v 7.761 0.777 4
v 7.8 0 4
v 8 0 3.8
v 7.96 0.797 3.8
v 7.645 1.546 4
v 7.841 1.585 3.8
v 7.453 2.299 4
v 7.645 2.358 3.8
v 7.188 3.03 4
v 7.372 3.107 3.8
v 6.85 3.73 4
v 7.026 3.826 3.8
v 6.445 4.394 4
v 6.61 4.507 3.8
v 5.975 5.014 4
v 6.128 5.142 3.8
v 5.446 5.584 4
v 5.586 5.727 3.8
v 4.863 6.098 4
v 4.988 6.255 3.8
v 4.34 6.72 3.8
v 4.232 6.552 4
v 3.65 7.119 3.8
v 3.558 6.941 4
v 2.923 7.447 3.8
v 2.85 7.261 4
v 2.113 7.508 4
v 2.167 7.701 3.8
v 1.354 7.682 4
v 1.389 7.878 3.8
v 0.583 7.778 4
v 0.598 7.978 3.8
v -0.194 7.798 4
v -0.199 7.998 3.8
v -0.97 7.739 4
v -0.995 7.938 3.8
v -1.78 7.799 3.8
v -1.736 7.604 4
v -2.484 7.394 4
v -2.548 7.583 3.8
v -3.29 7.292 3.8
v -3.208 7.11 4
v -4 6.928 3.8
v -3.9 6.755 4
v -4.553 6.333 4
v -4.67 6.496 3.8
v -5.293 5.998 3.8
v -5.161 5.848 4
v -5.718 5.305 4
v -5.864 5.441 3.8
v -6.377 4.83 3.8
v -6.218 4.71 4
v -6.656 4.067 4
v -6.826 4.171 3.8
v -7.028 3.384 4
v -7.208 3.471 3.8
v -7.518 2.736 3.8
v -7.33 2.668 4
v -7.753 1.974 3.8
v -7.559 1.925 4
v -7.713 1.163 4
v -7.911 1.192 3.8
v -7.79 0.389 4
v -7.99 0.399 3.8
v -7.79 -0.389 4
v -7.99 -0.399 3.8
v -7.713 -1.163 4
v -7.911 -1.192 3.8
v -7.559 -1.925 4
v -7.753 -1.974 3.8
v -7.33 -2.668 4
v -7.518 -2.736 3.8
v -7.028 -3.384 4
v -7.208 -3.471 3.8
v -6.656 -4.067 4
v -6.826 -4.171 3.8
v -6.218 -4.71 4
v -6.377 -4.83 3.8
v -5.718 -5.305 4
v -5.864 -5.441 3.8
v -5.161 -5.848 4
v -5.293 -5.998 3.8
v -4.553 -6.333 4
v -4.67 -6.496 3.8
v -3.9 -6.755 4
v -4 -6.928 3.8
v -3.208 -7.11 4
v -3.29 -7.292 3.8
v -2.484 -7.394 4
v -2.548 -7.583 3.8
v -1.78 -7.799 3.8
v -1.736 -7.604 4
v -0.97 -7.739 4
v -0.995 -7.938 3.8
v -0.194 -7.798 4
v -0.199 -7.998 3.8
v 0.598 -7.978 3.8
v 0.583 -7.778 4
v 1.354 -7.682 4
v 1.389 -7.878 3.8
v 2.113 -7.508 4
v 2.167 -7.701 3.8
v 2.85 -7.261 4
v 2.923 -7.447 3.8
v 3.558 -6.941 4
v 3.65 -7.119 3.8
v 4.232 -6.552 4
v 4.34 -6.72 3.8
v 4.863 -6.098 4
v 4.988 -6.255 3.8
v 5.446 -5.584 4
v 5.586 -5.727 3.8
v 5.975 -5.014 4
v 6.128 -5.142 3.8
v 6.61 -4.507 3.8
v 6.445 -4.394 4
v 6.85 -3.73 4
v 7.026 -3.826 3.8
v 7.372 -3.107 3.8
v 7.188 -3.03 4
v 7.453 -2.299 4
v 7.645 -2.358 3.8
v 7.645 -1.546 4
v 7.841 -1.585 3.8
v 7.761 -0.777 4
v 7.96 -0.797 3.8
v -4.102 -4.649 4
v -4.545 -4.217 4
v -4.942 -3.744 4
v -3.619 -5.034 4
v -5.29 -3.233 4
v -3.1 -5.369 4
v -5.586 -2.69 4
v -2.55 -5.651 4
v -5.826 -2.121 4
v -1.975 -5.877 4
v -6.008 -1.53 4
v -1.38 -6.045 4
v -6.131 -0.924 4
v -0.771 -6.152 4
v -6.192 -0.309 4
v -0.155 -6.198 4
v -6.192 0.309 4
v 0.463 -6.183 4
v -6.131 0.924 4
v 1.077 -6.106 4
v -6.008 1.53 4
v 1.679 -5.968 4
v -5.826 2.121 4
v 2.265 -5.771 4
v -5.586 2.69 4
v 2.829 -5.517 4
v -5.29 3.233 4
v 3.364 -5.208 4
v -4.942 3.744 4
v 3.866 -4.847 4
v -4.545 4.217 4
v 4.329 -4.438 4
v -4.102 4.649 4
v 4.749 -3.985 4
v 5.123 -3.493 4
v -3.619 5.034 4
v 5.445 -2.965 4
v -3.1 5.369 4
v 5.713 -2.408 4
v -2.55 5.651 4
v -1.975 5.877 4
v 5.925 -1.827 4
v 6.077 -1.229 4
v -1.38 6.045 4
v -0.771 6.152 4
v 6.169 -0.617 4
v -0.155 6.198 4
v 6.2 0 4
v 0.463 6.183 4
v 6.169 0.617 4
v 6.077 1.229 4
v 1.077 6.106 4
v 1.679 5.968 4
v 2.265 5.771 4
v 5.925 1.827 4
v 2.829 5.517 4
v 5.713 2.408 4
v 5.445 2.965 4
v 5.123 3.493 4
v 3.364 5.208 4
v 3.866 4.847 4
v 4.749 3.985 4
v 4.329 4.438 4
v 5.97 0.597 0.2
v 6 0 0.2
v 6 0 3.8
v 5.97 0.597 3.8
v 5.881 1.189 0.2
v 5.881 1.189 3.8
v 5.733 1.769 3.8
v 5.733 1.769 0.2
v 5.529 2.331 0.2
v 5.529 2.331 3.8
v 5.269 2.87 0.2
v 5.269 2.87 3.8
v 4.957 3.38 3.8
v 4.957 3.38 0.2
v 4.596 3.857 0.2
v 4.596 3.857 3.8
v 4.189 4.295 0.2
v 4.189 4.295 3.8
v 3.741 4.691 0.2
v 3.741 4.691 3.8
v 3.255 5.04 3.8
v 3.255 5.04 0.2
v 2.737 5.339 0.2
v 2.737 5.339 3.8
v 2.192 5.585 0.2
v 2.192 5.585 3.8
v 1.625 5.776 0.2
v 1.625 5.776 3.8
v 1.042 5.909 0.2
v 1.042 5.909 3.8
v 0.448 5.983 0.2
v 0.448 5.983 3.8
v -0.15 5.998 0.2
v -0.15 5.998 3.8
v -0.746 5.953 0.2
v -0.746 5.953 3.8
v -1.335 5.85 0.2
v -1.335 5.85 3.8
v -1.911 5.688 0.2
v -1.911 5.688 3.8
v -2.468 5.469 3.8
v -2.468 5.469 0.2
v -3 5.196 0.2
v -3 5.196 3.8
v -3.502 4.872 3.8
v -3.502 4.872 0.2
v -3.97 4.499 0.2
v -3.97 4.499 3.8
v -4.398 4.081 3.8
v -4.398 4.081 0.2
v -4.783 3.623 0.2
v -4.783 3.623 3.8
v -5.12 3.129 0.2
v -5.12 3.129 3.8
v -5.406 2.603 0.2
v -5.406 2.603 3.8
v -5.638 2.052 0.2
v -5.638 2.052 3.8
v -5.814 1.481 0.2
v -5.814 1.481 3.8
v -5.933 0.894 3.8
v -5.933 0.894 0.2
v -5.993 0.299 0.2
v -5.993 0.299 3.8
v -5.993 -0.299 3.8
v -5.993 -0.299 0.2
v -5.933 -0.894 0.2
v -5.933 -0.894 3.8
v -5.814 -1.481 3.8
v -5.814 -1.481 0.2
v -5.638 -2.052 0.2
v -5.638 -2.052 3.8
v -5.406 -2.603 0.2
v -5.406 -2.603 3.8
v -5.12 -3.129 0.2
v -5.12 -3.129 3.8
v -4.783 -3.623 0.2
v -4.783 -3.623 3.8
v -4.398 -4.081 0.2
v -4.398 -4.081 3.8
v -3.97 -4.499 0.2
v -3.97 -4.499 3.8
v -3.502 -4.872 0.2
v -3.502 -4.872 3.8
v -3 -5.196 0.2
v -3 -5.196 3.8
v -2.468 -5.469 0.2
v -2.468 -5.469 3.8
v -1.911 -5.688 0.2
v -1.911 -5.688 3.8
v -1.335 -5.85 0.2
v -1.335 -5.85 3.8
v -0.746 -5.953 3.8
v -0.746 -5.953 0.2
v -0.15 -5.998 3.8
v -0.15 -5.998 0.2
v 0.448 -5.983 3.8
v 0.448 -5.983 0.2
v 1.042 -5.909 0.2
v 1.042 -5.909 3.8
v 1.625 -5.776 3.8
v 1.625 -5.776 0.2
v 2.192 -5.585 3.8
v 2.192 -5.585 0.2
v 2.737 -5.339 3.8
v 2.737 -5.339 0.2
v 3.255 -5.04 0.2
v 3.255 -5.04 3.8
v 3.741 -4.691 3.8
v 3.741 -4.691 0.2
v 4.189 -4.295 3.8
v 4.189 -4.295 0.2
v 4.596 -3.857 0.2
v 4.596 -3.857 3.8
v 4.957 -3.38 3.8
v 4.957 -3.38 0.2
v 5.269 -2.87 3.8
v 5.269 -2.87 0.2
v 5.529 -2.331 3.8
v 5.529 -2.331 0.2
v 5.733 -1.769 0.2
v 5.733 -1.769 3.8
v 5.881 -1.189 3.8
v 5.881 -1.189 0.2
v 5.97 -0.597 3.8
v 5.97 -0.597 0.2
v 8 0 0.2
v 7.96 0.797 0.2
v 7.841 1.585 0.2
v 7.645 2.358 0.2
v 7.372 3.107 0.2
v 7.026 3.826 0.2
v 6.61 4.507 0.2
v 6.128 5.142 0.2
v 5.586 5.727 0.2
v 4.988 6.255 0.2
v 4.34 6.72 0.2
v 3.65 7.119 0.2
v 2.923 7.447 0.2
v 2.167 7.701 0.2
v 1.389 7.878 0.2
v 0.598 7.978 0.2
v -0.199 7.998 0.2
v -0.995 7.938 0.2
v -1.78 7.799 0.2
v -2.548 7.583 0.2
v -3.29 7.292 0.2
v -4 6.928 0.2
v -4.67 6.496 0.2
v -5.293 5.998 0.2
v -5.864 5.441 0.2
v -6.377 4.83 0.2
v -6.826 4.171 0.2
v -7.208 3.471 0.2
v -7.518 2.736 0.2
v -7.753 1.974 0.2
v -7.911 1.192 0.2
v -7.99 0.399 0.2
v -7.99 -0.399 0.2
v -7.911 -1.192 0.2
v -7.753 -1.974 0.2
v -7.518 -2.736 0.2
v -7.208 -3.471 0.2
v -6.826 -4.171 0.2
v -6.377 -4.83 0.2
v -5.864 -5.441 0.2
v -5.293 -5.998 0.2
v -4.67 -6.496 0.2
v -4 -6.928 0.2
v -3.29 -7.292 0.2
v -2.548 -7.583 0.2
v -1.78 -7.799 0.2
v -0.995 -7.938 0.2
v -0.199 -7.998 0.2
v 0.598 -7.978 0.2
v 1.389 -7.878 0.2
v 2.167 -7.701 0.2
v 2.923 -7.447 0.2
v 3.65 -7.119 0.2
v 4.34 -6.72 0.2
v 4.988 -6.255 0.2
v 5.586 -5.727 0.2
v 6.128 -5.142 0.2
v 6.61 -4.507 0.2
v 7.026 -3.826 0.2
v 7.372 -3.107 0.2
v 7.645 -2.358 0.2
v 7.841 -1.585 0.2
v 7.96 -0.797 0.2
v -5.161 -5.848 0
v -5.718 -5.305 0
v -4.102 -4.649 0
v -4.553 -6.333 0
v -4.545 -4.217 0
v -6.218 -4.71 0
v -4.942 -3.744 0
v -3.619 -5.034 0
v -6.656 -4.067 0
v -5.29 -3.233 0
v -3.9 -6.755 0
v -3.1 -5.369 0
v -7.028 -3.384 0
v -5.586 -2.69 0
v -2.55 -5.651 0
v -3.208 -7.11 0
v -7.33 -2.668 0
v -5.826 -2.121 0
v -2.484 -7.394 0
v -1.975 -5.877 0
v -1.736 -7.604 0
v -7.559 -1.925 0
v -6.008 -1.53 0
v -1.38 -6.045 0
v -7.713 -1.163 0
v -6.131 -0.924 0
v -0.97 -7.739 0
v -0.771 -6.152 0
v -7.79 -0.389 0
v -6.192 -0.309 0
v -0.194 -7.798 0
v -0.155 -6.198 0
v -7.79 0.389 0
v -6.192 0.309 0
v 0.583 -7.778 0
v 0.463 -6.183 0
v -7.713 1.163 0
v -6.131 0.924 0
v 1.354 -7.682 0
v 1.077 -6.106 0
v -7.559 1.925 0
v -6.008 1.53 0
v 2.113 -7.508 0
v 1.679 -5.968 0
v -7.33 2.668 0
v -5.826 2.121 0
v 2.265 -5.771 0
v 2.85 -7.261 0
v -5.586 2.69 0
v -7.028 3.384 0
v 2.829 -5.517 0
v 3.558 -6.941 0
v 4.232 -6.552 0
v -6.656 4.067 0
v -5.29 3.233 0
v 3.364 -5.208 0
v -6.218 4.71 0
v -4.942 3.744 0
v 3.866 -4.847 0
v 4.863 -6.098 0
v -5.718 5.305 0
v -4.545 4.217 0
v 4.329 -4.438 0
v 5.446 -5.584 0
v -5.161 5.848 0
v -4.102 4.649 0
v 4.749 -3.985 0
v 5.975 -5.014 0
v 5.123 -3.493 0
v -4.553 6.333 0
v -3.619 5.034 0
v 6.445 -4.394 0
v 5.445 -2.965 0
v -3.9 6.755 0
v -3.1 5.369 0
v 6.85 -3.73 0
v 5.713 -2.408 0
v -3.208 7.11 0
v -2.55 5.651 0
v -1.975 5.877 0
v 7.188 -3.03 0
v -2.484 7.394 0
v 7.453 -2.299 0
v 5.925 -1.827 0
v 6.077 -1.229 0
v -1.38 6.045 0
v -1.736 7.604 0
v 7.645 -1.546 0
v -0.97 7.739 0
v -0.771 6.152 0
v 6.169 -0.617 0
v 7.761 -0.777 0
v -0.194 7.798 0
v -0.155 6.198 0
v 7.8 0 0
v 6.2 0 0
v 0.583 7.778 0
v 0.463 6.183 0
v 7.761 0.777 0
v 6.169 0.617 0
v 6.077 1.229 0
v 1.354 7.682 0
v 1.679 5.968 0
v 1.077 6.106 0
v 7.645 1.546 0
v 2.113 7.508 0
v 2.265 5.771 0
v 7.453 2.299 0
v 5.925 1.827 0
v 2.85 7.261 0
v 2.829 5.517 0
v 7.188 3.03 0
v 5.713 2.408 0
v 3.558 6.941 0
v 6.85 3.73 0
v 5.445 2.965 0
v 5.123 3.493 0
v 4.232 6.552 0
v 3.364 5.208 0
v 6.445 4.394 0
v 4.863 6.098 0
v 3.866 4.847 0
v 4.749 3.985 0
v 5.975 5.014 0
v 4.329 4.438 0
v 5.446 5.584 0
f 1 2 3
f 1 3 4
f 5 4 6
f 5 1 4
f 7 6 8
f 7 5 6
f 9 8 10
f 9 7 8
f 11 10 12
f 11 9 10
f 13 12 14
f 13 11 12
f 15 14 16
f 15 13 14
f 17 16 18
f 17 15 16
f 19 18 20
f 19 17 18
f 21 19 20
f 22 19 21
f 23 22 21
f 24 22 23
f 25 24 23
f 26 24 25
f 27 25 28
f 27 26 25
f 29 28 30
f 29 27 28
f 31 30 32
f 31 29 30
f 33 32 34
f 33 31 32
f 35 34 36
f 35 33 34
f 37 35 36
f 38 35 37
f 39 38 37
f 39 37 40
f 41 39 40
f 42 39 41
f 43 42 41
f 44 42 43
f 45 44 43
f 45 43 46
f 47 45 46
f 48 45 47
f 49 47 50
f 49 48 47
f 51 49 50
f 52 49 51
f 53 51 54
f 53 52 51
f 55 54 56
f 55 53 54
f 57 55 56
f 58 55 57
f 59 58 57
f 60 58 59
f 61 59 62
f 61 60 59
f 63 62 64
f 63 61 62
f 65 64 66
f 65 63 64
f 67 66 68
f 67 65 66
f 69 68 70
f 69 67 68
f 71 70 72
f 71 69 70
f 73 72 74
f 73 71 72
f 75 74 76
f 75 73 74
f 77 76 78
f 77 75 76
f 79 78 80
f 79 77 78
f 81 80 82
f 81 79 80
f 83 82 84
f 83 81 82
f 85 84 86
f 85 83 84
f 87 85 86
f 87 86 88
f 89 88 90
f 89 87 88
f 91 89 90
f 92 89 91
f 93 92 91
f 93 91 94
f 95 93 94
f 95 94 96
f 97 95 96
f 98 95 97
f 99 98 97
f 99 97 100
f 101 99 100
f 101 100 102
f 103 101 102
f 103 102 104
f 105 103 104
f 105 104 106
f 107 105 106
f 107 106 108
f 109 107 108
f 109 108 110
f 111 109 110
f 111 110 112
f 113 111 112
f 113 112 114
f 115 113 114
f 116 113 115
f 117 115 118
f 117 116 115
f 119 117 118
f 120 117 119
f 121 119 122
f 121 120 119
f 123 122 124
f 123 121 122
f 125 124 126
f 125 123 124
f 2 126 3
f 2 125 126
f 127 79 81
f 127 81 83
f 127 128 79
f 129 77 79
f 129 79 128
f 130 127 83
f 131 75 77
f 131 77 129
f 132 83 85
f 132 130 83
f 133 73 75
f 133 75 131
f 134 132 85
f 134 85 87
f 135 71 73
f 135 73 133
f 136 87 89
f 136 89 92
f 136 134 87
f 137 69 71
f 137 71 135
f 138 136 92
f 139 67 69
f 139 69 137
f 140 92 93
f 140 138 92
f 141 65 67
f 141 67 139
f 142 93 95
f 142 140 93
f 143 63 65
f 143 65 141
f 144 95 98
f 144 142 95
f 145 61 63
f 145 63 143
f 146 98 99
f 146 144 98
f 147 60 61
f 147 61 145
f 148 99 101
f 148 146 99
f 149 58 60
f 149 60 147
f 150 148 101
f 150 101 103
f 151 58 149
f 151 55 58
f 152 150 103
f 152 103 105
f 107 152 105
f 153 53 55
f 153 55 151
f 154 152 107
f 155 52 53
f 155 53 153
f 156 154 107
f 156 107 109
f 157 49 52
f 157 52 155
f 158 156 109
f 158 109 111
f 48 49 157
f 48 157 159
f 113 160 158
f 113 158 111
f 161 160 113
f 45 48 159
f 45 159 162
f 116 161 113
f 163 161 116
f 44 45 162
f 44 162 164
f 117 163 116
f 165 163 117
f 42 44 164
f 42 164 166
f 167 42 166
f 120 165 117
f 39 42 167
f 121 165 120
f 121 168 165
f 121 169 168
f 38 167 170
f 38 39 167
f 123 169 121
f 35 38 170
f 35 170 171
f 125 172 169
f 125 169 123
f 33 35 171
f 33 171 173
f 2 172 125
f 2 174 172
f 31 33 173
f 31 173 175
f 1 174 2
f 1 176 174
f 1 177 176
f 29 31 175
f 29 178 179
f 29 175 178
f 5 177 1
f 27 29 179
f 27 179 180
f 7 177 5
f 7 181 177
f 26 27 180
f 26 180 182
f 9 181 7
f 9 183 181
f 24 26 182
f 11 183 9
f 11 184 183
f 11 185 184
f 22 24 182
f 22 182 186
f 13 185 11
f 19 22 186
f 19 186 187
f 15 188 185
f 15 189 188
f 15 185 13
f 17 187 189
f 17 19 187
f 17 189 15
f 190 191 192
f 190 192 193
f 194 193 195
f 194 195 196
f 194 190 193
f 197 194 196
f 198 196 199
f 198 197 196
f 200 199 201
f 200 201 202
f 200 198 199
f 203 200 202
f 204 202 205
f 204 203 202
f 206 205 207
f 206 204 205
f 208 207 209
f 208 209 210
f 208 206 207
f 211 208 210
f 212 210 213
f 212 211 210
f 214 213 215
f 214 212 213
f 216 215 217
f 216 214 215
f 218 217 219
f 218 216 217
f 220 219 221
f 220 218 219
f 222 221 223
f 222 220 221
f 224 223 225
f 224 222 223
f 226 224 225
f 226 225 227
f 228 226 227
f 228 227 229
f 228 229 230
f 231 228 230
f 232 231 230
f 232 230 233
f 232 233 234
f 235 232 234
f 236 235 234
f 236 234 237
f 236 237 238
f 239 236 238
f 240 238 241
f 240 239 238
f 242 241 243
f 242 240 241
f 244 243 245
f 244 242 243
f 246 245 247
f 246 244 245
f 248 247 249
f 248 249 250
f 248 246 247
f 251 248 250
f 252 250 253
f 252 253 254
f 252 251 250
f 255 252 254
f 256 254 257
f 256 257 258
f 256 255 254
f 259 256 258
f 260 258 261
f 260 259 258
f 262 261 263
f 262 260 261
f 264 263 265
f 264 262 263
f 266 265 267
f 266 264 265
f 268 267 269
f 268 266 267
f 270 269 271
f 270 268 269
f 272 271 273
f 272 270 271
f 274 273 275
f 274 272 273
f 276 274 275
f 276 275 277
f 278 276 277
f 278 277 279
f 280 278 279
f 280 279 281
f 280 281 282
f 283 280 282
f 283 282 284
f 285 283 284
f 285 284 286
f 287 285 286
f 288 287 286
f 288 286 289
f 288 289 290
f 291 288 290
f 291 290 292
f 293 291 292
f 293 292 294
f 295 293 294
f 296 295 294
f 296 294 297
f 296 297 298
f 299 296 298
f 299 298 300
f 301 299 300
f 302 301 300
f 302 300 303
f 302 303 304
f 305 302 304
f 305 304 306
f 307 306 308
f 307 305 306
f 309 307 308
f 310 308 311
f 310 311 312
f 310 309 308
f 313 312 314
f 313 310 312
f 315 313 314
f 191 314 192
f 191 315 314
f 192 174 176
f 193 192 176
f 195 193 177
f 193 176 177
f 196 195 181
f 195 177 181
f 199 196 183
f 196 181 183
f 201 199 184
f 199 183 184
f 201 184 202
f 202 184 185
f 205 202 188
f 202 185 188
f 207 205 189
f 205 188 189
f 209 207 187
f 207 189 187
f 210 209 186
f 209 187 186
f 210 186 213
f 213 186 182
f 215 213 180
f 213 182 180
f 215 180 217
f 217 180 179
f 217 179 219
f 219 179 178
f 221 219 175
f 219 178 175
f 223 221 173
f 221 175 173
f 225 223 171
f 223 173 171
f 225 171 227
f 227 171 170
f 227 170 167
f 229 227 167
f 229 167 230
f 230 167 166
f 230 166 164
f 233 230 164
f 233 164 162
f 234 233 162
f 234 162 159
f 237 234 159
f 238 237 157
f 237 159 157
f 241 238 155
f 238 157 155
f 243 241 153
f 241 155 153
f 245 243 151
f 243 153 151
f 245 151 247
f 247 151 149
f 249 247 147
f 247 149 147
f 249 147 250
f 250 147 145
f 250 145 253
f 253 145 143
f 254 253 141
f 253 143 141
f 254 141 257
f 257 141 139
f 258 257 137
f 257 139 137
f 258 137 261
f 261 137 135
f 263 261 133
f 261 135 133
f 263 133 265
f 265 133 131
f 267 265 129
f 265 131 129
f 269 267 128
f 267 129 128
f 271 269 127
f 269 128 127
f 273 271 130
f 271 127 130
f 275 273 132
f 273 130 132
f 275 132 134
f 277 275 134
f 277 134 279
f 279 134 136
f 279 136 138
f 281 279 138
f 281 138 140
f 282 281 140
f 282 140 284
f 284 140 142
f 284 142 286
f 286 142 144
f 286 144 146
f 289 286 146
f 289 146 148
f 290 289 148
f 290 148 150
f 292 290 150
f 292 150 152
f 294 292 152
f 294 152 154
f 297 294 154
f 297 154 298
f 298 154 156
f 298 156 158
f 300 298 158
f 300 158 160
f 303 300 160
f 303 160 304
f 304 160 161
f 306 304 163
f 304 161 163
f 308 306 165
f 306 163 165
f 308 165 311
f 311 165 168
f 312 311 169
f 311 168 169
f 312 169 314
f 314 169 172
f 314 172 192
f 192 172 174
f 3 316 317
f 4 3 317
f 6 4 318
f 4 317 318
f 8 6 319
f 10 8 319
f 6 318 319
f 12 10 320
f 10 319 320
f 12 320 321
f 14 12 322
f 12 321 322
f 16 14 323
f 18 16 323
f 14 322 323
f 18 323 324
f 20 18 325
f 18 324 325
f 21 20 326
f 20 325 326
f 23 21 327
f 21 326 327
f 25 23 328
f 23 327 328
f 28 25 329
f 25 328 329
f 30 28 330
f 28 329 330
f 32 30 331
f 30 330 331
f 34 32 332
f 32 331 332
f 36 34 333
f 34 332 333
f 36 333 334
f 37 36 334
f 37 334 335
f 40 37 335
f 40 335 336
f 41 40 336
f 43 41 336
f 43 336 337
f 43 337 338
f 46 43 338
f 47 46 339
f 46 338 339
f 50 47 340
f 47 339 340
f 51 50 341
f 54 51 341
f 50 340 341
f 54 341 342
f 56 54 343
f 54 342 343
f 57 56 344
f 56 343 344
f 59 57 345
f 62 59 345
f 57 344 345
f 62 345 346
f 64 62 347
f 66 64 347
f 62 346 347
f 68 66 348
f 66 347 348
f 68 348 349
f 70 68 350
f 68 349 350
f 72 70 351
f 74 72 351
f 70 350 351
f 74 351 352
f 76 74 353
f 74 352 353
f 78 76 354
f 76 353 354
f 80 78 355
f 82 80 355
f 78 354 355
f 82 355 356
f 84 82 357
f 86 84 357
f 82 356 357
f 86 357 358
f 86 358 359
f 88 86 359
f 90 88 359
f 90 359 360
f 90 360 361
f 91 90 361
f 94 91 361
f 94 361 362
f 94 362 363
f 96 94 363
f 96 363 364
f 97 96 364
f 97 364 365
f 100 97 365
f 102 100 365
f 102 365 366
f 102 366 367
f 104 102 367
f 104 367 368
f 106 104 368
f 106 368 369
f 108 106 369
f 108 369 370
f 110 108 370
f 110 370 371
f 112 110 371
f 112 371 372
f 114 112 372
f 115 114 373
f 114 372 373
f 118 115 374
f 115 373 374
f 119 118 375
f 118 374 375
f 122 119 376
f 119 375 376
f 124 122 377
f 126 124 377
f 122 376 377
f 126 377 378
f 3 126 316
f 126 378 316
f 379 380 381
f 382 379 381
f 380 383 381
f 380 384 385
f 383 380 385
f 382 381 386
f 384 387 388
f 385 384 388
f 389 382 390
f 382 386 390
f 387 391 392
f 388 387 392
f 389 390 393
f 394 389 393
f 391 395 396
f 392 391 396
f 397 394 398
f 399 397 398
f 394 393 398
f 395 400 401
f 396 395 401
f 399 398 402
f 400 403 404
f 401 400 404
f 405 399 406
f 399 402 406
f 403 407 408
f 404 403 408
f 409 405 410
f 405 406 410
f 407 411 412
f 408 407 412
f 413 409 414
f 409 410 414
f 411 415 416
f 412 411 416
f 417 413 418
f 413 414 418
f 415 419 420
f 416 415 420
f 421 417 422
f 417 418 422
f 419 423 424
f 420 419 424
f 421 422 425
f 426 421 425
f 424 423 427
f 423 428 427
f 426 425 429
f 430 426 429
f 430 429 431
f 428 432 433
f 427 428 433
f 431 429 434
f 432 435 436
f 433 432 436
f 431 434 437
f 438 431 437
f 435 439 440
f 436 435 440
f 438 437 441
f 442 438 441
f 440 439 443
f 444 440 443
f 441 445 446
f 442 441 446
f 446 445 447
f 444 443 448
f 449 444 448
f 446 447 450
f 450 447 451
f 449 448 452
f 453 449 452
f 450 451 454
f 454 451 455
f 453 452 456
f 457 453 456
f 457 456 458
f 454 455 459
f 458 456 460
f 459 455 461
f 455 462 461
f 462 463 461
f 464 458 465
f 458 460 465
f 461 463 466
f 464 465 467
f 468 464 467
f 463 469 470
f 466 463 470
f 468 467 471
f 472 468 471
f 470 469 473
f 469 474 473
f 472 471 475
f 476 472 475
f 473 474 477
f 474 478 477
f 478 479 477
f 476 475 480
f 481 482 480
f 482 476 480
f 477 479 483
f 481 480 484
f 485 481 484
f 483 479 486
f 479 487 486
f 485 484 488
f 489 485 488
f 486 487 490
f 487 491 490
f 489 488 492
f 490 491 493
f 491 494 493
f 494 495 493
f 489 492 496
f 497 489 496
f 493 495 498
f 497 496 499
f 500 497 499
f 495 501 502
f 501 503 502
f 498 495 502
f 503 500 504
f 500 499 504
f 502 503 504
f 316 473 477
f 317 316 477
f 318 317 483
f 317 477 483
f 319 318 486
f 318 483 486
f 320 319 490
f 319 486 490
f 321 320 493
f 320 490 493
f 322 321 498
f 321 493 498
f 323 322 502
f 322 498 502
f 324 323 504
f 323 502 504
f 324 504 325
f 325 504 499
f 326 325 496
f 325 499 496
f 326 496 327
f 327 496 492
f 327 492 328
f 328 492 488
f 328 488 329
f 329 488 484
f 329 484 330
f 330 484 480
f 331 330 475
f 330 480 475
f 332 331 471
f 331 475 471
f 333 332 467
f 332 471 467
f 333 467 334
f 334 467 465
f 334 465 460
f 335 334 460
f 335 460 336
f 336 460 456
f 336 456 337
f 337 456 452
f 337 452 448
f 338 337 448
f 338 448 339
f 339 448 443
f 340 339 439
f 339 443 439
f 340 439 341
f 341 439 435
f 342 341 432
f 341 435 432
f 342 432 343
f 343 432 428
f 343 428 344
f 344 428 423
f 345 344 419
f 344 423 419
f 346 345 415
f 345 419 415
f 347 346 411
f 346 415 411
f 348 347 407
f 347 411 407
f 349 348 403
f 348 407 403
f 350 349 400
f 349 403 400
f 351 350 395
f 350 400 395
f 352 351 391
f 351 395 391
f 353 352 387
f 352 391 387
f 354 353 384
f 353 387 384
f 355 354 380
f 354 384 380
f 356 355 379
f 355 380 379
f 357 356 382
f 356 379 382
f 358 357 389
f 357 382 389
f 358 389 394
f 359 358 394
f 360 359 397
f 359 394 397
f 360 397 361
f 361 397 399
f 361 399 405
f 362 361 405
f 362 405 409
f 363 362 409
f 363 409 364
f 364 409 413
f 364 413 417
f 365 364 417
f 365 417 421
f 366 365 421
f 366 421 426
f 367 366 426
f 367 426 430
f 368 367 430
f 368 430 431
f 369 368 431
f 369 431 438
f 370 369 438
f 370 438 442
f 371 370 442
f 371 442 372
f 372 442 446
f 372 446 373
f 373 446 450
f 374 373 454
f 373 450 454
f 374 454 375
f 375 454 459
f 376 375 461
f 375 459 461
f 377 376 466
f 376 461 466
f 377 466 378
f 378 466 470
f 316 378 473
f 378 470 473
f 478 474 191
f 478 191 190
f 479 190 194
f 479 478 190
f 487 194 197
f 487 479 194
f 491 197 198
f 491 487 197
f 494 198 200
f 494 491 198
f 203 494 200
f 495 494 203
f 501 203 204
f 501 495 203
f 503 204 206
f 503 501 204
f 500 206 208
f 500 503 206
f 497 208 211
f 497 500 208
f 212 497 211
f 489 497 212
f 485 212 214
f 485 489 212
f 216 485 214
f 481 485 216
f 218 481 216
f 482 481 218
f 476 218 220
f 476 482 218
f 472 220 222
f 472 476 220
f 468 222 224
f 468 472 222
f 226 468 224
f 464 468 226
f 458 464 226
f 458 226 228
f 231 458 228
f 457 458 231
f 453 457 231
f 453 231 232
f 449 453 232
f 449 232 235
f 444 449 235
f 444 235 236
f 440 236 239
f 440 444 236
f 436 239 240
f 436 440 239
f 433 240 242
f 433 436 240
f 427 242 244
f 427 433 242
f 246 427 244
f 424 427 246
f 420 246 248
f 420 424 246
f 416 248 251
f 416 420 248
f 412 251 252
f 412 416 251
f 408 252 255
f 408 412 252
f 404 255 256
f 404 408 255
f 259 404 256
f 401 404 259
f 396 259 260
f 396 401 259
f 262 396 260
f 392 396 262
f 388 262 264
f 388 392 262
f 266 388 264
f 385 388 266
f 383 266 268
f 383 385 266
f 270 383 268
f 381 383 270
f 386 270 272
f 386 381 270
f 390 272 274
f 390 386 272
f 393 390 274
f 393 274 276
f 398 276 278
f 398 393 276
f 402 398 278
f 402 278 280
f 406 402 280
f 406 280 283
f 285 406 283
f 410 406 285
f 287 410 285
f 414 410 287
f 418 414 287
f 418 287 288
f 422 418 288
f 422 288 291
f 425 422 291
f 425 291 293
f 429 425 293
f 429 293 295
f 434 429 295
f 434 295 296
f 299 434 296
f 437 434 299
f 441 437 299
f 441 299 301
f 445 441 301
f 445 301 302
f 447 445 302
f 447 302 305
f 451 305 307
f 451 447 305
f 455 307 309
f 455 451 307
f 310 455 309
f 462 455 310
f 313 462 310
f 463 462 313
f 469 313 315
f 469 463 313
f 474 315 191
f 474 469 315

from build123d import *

# Parameters (mm, degrees)
ESQUISSE1_R        = 8
ESQUISSE1_R_2      = 6
BOSS_EXTRU_1_DEPTH = 4
CHANFREIN1_SIZE    = 0.2


with BuildPart() as part:
    # Esquisse1 → Boss.-Extru.1 (new body)
    with BuildSketch(Plane.XY):
        Circle(ESQUISSE1_R)
        Circle(ESQUISSE1_R_2, mode=Mode.SUBTRACT)
    extrude(amount=BOSS_EXTRU_1_DEPTH)

    # Chanfrein1
    chanfrein1_edges = [part.edges().sort_by_distance(p)[0] for p in [
        (-8, 0, 0),
        (-8, 0, 4),
        (-6, 0, 0),
        (-6, 0, 4),
    ]]
    chamfer(chanfrein1_edges, length=CHANFREIN1_SIZE)


solid = part.part
